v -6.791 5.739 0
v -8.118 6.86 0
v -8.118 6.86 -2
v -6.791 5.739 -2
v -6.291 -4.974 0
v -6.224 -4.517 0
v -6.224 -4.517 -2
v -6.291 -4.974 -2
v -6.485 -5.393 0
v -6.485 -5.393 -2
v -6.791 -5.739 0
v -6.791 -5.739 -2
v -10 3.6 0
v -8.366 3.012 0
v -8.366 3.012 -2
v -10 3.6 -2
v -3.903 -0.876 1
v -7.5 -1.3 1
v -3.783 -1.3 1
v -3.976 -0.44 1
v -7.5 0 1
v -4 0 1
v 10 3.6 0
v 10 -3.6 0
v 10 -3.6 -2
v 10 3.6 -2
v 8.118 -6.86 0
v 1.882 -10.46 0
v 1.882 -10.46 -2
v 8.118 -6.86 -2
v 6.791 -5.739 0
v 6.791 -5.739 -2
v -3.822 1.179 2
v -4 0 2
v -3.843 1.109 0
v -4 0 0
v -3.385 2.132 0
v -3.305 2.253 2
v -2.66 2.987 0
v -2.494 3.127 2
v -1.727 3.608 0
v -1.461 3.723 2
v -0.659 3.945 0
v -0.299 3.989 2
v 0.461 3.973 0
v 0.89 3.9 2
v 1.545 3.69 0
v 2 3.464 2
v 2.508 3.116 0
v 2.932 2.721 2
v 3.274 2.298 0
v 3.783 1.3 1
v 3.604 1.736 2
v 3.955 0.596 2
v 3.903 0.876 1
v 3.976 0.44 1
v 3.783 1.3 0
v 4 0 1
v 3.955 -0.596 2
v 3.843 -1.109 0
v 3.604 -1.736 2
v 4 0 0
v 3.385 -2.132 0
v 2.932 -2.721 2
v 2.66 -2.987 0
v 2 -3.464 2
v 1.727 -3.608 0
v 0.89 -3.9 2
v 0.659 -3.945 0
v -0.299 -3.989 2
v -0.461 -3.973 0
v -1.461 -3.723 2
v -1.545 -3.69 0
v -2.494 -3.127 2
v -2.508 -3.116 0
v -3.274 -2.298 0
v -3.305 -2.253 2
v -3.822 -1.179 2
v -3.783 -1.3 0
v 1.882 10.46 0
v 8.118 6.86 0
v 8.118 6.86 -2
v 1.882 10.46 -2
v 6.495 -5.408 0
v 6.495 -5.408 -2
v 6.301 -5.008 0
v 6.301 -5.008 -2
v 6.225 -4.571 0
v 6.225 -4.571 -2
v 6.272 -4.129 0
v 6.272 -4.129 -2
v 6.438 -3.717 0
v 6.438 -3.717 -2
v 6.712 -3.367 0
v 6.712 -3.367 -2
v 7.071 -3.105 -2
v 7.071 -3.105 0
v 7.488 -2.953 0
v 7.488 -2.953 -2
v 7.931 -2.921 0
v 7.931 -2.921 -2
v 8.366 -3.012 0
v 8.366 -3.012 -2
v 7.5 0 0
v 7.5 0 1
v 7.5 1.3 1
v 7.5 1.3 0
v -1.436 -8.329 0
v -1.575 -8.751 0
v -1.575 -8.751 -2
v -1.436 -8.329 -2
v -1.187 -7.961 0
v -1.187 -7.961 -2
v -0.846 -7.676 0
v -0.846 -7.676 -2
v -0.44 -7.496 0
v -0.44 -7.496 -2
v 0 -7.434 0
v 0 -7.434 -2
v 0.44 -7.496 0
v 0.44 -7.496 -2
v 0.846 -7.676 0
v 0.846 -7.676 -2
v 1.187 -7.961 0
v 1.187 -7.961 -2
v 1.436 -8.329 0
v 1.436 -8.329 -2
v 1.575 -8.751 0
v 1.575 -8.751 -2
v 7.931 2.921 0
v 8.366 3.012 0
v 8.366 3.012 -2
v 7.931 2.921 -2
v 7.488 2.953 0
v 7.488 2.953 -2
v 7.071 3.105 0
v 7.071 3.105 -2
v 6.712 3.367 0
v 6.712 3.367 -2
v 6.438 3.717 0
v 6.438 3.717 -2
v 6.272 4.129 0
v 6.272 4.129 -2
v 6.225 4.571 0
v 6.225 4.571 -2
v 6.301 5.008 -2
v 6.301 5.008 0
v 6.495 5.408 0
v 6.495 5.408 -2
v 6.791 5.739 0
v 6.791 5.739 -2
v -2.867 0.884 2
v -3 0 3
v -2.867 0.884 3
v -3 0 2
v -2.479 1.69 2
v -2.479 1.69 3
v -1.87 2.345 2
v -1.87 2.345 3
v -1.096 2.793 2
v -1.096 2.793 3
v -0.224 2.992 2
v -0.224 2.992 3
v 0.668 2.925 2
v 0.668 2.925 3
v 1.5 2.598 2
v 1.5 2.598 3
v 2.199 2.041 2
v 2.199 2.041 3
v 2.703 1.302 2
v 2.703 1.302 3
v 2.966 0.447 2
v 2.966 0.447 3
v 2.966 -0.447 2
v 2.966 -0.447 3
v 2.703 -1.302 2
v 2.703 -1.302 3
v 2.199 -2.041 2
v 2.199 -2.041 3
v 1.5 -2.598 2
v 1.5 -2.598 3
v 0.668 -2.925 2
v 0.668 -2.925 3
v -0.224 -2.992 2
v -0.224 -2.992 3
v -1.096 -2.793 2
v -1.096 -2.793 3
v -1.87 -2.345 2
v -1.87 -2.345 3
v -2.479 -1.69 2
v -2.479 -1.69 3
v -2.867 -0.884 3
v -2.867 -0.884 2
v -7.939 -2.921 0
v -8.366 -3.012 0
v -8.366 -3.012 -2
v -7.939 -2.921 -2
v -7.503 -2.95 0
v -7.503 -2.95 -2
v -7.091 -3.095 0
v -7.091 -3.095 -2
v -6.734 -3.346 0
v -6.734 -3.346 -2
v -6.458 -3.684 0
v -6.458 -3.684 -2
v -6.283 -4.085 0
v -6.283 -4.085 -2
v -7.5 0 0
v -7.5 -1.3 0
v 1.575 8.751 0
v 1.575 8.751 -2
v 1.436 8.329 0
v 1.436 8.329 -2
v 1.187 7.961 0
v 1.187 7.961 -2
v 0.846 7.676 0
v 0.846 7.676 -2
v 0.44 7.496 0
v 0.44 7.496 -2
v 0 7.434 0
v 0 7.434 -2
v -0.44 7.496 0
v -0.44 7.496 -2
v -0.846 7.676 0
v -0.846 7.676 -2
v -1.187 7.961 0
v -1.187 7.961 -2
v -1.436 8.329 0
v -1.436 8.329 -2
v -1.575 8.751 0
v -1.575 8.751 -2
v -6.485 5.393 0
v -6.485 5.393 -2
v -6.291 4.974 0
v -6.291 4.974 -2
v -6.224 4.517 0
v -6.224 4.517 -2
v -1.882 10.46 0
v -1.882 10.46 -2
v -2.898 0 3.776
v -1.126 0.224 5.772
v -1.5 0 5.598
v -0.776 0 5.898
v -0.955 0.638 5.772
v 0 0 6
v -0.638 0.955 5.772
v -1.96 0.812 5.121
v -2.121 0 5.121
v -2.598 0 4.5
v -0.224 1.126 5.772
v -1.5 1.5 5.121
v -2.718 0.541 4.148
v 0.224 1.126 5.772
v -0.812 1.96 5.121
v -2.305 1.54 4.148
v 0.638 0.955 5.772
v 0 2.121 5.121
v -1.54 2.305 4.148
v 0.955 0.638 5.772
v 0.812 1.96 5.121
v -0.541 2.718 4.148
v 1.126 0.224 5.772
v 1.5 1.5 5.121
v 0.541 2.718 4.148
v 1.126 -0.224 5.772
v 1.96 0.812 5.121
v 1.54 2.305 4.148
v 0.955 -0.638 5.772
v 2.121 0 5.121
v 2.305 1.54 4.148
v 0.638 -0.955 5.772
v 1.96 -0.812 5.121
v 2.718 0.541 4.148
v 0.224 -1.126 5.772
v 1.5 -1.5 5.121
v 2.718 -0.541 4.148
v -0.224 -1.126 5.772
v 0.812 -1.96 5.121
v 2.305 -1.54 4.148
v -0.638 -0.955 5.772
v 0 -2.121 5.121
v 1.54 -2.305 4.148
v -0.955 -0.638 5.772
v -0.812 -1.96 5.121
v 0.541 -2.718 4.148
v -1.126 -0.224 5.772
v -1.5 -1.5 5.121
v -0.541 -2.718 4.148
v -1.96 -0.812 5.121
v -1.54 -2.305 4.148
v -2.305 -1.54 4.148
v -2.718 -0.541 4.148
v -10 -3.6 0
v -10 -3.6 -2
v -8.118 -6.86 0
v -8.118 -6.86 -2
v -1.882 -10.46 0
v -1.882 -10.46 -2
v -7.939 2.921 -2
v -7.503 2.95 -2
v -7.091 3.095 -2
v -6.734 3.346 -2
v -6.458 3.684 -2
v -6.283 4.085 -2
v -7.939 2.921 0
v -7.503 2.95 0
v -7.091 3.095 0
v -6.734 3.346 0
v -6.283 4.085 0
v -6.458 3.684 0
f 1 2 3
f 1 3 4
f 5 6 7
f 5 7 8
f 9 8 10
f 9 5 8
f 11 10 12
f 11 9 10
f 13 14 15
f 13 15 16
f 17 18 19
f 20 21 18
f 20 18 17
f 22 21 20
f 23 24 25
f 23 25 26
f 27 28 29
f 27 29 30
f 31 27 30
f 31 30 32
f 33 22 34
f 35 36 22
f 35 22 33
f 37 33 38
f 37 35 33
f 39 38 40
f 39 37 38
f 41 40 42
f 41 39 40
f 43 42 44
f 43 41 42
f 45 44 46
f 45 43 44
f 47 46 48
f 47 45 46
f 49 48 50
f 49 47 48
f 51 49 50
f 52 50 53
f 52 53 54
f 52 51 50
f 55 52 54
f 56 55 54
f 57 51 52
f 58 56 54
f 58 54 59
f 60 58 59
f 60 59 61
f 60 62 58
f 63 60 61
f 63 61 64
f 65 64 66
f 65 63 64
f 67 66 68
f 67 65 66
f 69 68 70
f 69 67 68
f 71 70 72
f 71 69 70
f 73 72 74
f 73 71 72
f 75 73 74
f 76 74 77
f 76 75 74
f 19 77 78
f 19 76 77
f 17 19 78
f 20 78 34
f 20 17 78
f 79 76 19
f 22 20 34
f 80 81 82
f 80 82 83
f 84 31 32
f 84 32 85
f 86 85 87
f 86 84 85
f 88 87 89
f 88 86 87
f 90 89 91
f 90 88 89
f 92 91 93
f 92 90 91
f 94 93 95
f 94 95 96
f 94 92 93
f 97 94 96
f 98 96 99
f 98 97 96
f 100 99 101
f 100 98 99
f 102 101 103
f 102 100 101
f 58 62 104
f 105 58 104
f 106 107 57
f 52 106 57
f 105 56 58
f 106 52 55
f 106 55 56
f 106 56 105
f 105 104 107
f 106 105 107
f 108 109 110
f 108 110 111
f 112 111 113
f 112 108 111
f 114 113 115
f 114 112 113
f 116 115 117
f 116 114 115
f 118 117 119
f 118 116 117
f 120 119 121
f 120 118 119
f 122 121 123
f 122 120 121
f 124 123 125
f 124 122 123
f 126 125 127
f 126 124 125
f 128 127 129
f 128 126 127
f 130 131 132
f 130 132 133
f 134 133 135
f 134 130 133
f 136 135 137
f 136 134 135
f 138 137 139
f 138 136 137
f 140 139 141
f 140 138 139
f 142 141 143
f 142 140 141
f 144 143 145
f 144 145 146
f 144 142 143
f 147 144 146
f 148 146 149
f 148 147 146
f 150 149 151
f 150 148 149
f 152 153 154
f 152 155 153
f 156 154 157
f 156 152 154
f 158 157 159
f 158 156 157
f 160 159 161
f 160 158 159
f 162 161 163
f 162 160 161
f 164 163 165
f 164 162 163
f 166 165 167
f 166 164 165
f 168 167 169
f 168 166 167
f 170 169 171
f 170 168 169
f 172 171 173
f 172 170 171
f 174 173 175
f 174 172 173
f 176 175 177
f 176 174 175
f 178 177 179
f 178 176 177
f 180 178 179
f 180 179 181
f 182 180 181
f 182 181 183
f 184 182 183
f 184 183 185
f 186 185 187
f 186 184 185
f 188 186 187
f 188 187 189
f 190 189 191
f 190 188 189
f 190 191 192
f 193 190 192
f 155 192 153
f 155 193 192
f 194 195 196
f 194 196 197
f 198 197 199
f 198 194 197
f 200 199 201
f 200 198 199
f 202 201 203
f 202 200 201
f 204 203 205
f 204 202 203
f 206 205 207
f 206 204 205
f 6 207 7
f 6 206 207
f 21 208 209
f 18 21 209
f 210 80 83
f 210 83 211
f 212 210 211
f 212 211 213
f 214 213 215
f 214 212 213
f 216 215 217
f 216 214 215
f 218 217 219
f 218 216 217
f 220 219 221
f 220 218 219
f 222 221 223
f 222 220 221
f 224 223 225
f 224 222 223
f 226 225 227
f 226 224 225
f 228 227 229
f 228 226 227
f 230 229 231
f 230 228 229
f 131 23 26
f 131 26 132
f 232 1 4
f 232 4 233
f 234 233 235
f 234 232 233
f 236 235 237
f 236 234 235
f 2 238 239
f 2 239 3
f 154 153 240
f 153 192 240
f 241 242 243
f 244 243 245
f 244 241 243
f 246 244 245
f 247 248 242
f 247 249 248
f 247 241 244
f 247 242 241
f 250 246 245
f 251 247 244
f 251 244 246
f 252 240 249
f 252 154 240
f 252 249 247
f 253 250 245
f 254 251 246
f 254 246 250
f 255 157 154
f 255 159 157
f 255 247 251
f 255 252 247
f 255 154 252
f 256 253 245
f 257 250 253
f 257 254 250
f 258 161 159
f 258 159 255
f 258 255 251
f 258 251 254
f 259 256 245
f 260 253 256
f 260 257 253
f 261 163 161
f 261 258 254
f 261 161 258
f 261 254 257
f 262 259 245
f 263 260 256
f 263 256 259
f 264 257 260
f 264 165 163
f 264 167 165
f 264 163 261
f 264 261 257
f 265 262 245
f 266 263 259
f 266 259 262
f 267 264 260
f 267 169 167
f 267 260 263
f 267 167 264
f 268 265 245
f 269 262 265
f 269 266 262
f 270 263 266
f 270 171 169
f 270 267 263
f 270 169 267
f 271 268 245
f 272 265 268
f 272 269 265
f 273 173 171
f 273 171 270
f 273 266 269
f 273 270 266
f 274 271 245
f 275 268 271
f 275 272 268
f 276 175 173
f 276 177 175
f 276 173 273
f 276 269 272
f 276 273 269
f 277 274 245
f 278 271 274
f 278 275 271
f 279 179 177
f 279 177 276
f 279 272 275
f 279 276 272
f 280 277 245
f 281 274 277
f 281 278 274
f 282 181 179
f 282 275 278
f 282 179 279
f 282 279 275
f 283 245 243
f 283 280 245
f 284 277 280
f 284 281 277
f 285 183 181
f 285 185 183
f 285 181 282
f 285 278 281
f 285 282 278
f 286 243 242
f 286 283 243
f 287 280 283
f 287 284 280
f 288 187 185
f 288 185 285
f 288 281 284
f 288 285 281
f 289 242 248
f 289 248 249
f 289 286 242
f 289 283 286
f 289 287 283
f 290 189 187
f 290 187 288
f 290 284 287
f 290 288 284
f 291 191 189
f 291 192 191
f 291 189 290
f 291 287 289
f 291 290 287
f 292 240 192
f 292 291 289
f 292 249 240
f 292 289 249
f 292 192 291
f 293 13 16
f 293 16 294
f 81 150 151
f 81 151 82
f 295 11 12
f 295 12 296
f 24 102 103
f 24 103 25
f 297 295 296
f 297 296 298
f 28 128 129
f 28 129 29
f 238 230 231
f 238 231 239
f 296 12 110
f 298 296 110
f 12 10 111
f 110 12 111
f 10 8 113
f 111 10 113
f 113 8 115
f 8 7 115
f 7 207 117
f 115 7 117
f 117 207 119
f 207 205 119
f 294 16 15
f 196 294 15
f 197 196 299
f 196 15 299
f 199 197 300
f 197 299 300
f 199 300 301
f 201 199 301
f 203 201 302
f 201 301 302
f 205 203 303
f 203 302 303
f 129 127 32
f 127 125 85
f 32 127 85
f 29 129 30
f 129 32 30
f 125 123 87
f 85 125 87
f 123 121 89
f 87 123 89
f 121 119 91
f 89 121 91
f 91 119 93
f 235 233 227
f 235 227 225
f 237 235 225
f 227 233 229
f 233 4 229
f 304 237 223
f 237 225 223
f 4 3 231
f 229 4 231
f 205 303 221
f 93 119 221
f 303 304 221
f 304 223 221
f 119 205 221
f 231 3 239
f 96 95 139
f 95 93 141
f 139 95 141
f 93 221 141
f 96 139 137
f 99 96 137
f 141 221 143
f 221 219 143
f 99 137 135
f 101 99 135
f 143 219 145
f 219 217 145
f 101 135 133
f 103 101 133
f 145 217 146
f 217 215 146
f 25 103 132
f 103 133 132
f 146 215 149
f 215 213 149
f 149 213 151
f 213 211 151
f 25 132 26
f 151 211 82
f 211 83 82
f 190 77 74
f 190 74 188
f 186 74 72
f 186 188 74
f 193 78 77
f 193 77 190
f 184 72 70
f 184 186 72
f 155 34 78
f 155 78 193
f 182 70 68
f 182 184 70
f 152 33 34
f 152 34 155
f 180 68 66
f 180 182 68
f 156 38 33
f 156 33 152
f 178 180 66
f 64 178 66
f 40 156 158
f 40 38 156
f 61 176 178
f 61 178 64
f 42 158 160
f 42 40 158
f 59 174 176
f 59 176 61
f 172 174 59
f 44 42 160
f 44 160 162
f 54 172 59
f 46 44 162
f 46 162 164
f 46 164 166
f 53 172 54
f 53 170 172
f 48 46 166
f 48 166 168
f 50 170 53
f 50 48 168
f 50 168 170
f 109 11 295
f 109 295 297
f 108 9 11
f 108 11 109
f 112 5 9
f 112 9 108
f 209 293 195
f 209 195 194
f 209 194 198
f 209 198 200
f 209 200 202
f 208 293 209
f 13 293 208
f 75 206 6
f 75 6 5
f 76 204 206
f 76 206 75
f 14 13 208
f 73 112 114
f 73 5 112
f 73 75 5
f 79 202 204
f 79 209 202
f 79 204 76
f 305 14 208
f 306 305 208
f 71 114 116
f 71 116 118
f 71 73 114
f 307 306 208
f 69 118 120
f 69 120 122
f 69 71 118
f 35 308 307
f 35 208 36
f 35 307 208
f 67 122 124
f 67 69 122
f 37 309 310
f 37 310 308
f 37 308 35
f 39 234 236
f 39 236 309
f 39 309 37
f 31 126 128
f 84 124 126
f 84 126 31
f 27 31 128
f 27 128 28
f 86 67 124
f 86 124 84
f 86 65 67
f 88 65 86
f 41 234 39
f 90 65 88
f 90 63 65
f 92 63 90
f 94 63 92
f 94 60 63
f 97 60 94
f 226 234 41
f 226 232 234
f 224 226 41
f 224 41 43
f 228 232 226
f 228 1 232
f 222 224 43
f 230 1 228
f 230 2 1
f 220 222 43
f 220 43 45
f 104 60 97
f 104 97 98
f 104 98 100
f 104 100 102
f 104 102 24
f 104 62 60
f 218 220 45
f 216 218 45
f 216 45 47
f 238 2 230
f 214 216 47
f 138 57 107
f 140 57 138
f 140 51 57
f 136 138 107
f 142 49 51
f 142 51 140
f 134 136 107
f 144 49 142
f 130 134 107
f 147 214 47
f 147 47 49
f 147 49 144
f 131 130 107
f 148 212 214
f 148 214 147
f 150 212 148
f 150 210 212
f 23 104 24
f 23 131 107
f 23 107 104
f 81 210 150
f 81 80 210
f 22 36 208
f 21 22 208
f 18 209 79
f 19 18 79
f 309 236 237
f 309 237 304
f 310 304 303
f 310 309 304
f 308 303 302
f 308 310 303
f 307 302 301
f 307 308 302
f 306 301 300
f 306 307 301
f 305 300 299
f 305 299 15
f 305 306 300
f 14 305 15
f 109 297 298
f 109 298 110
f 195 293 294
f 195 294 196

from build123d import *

# Parameters (mm, degrees)
F1_DEPTH = 2
F5_DEPTH = 1


with BuildPart() as f1:
    # F0 (on Top) → F1 (new body)
    with BuildSketch(Plane.XY):
        Polygon((-6.7911229225, 5.7391721177), (0, 0), (-1.5747073965, 8.7508710698), (-1.8823085464, 10.4602540378), (-8.1176914536, 6.8602540378), align=None)
        with BuildLine():
            Line((-1.5747073965, 8.7508710698), (0, 0))
            Line((0, 0), (1.5747074179, 8.7508711884))
            ThreePointArc((1.5747074179, 8.7508711884), (6.02e-08, 7.4342376439), (-1.5747073965, 8.7508710698))
        make_face()
        Polygon((1.5747074179, 8.7508711884), (0, 0), (6.7911228899, 5.7391720902), (8.1176914536, 6.8602540378), (1.8823085464, 10.4602540378), align=None)
        with BuildLine():
            Line((6.7911228899, 5.7391720902), (0, 0))
            Line((0, 0), (8.3658305386, 3.0116989939))
            ThreePointArc((8.3658305386, 3.0116989939), (6.4382387283, 3.7171186992), (6.7911228899, 5.7391720902))
        make_face()
        Polygon((8.3658305386, 3.0116989939), (0, 0), (8.3658304092, -3.0116989473), (10, -3.6), (10, 3.6), align=None)
        with BuildLine():
            Line((8.3658304092, -3.0116989473), (0, 0))
            Line((0, 0), (6.7911229101, -5.7391721072))
            ThreePointArc((6.7911229101, -5.7391721072), (6.4382386873, -3.7171187701), (8.3658304092, -3.0116989473))
        make_face()
        Polygon((6.7911229101, -5.7391721072), (0, 0), (1.574707395, -8.7508710612), (1.8823085464, -10.4602540378), (8.1176914536, -6.8602540378), align=None)
        with BuildLine():
            Line((1.574707395, -8.7508710612), (0, 0))
            Line((0, 0), (-1.5747073992, -8.7508710849))
            ThreePointArc((-1.5747073992, -8.7508710849), (-1.21e-08, -7.4342376439), (1.574707395, -8.7508710612))
        make_face()
        Polygon((-1.5747073992, -8.7508710849), (0, 0), (-6.791122959, -5.7391721485), (-8.1176914536, -6.8602540378), (-1.8823085464, -10.4602540378), align=None)
        with BuildLine():
            Line((0, 0), (-8.3658303156, -3.0116989136))
            ThreePointArc((-8.3658303156, -3.0116989136), (-6.9038580047, -3.2080883373), (-6.2238793035, -4.517118822))
            ThreePointArc((-6.2238793035, -4.517118822), (-6.3726022536, -5.1907618464), (-6.791122959, -5.7391721485))
            Line((-6.791122959, -5.7391721485), (0, 0))
        make_face()
        Polygon((-8.3658305462, 3.0116989966), (-10, 3.6), (-10, -3.6), (-8.3658303156, -3.0116989136), (0, 0), align=None)
        with BuildLine():
            ThreePointArc((-6.2238793035, 4.517118822), (-6.9038581049, 3.2080882668), (-8.3658305462, 3.0116989966))
            Line((-8.3658305462, 3.0116989966), (0, 0))
            Line((0, 0), (-6.7911229225, 5.7391721177))
            ThreePointArc((-6.7911229225, 5.7391721177), (-6.3726022435, 5.1907618248), (-6.2238793035, 4.517118822))
        make_face()
    extrude(amount=-F1_DEPTH)

    # F2 (on Front) → F3 (revolve)
    with BuildSketch(Plane.XZ):
        with BuildLine():
            Line((-4, 0), (0, 0))
            Line((0, 0), (0, 6))
            ThreePointArc((0, 6), (-2.1213203436, 5.1213203436), (-3, 3))
            Line((-3, 3), (-3, 2))
            Line((-3, 2), (-4, 2))
            Line((-4, 2), (-4, 0))
        make_face()
    revolve(axis=Axis((0, 0, 3), (0, 0, -1)))

    # F4 (on face) → F5 (join)
    with BuildSketch(Plane.XY):
        with BuildLine():
            Line((-3.4071028195, -1.3), (-3.4071028195, 0))
            Line((-3.4071028195, 0), (-4, 0))
            ThreePointArc((-4, 0), (-3.9453405592, -0.6590052141), (-3.7828560639, -1.3))
            Line((-3.7828560639, -1.3), (-3.4071028195, -1.3))
        make_face()
        with BuildLine():
            ThreePointArc((-3.7828560639, -1.3), (-3.9453405592, -0.6590052141), (-4, 0))
            Line((-4, 0), (-7.5, 0))
            Line((-7.5, 0), (-7.5, -1.3))
            Line((-7.5, -1.3), (-3.7828560639, -1.3))
        make_face()
        with BuildLine():
            ThreePointArc((4, 0), (3.9453405592, 0.6590052141), (3.7828560639, 1.3))
            Line((3.7828560639, 1.3), (3.4071028195, 1.3))
            Line((3.4071028195, 1.3), (3.4071028195, 0))
            Line((3.4071028195, 0), (4, 0))
        make_face()
        with BuildLine():
            Line((7.5, 1.3), (3.7828560639, 1.3))
            ThreePointArc((3.7828560639, 1.3), (3.9453405592, 0.6590052141), (4, 0))
            Line((4, 0), (7.5, 0))
            Line((7.5, 0), (7.5, 1.3))
        make_face()
    extrude(amount=F5_DEPTH)


solid = f1.part
